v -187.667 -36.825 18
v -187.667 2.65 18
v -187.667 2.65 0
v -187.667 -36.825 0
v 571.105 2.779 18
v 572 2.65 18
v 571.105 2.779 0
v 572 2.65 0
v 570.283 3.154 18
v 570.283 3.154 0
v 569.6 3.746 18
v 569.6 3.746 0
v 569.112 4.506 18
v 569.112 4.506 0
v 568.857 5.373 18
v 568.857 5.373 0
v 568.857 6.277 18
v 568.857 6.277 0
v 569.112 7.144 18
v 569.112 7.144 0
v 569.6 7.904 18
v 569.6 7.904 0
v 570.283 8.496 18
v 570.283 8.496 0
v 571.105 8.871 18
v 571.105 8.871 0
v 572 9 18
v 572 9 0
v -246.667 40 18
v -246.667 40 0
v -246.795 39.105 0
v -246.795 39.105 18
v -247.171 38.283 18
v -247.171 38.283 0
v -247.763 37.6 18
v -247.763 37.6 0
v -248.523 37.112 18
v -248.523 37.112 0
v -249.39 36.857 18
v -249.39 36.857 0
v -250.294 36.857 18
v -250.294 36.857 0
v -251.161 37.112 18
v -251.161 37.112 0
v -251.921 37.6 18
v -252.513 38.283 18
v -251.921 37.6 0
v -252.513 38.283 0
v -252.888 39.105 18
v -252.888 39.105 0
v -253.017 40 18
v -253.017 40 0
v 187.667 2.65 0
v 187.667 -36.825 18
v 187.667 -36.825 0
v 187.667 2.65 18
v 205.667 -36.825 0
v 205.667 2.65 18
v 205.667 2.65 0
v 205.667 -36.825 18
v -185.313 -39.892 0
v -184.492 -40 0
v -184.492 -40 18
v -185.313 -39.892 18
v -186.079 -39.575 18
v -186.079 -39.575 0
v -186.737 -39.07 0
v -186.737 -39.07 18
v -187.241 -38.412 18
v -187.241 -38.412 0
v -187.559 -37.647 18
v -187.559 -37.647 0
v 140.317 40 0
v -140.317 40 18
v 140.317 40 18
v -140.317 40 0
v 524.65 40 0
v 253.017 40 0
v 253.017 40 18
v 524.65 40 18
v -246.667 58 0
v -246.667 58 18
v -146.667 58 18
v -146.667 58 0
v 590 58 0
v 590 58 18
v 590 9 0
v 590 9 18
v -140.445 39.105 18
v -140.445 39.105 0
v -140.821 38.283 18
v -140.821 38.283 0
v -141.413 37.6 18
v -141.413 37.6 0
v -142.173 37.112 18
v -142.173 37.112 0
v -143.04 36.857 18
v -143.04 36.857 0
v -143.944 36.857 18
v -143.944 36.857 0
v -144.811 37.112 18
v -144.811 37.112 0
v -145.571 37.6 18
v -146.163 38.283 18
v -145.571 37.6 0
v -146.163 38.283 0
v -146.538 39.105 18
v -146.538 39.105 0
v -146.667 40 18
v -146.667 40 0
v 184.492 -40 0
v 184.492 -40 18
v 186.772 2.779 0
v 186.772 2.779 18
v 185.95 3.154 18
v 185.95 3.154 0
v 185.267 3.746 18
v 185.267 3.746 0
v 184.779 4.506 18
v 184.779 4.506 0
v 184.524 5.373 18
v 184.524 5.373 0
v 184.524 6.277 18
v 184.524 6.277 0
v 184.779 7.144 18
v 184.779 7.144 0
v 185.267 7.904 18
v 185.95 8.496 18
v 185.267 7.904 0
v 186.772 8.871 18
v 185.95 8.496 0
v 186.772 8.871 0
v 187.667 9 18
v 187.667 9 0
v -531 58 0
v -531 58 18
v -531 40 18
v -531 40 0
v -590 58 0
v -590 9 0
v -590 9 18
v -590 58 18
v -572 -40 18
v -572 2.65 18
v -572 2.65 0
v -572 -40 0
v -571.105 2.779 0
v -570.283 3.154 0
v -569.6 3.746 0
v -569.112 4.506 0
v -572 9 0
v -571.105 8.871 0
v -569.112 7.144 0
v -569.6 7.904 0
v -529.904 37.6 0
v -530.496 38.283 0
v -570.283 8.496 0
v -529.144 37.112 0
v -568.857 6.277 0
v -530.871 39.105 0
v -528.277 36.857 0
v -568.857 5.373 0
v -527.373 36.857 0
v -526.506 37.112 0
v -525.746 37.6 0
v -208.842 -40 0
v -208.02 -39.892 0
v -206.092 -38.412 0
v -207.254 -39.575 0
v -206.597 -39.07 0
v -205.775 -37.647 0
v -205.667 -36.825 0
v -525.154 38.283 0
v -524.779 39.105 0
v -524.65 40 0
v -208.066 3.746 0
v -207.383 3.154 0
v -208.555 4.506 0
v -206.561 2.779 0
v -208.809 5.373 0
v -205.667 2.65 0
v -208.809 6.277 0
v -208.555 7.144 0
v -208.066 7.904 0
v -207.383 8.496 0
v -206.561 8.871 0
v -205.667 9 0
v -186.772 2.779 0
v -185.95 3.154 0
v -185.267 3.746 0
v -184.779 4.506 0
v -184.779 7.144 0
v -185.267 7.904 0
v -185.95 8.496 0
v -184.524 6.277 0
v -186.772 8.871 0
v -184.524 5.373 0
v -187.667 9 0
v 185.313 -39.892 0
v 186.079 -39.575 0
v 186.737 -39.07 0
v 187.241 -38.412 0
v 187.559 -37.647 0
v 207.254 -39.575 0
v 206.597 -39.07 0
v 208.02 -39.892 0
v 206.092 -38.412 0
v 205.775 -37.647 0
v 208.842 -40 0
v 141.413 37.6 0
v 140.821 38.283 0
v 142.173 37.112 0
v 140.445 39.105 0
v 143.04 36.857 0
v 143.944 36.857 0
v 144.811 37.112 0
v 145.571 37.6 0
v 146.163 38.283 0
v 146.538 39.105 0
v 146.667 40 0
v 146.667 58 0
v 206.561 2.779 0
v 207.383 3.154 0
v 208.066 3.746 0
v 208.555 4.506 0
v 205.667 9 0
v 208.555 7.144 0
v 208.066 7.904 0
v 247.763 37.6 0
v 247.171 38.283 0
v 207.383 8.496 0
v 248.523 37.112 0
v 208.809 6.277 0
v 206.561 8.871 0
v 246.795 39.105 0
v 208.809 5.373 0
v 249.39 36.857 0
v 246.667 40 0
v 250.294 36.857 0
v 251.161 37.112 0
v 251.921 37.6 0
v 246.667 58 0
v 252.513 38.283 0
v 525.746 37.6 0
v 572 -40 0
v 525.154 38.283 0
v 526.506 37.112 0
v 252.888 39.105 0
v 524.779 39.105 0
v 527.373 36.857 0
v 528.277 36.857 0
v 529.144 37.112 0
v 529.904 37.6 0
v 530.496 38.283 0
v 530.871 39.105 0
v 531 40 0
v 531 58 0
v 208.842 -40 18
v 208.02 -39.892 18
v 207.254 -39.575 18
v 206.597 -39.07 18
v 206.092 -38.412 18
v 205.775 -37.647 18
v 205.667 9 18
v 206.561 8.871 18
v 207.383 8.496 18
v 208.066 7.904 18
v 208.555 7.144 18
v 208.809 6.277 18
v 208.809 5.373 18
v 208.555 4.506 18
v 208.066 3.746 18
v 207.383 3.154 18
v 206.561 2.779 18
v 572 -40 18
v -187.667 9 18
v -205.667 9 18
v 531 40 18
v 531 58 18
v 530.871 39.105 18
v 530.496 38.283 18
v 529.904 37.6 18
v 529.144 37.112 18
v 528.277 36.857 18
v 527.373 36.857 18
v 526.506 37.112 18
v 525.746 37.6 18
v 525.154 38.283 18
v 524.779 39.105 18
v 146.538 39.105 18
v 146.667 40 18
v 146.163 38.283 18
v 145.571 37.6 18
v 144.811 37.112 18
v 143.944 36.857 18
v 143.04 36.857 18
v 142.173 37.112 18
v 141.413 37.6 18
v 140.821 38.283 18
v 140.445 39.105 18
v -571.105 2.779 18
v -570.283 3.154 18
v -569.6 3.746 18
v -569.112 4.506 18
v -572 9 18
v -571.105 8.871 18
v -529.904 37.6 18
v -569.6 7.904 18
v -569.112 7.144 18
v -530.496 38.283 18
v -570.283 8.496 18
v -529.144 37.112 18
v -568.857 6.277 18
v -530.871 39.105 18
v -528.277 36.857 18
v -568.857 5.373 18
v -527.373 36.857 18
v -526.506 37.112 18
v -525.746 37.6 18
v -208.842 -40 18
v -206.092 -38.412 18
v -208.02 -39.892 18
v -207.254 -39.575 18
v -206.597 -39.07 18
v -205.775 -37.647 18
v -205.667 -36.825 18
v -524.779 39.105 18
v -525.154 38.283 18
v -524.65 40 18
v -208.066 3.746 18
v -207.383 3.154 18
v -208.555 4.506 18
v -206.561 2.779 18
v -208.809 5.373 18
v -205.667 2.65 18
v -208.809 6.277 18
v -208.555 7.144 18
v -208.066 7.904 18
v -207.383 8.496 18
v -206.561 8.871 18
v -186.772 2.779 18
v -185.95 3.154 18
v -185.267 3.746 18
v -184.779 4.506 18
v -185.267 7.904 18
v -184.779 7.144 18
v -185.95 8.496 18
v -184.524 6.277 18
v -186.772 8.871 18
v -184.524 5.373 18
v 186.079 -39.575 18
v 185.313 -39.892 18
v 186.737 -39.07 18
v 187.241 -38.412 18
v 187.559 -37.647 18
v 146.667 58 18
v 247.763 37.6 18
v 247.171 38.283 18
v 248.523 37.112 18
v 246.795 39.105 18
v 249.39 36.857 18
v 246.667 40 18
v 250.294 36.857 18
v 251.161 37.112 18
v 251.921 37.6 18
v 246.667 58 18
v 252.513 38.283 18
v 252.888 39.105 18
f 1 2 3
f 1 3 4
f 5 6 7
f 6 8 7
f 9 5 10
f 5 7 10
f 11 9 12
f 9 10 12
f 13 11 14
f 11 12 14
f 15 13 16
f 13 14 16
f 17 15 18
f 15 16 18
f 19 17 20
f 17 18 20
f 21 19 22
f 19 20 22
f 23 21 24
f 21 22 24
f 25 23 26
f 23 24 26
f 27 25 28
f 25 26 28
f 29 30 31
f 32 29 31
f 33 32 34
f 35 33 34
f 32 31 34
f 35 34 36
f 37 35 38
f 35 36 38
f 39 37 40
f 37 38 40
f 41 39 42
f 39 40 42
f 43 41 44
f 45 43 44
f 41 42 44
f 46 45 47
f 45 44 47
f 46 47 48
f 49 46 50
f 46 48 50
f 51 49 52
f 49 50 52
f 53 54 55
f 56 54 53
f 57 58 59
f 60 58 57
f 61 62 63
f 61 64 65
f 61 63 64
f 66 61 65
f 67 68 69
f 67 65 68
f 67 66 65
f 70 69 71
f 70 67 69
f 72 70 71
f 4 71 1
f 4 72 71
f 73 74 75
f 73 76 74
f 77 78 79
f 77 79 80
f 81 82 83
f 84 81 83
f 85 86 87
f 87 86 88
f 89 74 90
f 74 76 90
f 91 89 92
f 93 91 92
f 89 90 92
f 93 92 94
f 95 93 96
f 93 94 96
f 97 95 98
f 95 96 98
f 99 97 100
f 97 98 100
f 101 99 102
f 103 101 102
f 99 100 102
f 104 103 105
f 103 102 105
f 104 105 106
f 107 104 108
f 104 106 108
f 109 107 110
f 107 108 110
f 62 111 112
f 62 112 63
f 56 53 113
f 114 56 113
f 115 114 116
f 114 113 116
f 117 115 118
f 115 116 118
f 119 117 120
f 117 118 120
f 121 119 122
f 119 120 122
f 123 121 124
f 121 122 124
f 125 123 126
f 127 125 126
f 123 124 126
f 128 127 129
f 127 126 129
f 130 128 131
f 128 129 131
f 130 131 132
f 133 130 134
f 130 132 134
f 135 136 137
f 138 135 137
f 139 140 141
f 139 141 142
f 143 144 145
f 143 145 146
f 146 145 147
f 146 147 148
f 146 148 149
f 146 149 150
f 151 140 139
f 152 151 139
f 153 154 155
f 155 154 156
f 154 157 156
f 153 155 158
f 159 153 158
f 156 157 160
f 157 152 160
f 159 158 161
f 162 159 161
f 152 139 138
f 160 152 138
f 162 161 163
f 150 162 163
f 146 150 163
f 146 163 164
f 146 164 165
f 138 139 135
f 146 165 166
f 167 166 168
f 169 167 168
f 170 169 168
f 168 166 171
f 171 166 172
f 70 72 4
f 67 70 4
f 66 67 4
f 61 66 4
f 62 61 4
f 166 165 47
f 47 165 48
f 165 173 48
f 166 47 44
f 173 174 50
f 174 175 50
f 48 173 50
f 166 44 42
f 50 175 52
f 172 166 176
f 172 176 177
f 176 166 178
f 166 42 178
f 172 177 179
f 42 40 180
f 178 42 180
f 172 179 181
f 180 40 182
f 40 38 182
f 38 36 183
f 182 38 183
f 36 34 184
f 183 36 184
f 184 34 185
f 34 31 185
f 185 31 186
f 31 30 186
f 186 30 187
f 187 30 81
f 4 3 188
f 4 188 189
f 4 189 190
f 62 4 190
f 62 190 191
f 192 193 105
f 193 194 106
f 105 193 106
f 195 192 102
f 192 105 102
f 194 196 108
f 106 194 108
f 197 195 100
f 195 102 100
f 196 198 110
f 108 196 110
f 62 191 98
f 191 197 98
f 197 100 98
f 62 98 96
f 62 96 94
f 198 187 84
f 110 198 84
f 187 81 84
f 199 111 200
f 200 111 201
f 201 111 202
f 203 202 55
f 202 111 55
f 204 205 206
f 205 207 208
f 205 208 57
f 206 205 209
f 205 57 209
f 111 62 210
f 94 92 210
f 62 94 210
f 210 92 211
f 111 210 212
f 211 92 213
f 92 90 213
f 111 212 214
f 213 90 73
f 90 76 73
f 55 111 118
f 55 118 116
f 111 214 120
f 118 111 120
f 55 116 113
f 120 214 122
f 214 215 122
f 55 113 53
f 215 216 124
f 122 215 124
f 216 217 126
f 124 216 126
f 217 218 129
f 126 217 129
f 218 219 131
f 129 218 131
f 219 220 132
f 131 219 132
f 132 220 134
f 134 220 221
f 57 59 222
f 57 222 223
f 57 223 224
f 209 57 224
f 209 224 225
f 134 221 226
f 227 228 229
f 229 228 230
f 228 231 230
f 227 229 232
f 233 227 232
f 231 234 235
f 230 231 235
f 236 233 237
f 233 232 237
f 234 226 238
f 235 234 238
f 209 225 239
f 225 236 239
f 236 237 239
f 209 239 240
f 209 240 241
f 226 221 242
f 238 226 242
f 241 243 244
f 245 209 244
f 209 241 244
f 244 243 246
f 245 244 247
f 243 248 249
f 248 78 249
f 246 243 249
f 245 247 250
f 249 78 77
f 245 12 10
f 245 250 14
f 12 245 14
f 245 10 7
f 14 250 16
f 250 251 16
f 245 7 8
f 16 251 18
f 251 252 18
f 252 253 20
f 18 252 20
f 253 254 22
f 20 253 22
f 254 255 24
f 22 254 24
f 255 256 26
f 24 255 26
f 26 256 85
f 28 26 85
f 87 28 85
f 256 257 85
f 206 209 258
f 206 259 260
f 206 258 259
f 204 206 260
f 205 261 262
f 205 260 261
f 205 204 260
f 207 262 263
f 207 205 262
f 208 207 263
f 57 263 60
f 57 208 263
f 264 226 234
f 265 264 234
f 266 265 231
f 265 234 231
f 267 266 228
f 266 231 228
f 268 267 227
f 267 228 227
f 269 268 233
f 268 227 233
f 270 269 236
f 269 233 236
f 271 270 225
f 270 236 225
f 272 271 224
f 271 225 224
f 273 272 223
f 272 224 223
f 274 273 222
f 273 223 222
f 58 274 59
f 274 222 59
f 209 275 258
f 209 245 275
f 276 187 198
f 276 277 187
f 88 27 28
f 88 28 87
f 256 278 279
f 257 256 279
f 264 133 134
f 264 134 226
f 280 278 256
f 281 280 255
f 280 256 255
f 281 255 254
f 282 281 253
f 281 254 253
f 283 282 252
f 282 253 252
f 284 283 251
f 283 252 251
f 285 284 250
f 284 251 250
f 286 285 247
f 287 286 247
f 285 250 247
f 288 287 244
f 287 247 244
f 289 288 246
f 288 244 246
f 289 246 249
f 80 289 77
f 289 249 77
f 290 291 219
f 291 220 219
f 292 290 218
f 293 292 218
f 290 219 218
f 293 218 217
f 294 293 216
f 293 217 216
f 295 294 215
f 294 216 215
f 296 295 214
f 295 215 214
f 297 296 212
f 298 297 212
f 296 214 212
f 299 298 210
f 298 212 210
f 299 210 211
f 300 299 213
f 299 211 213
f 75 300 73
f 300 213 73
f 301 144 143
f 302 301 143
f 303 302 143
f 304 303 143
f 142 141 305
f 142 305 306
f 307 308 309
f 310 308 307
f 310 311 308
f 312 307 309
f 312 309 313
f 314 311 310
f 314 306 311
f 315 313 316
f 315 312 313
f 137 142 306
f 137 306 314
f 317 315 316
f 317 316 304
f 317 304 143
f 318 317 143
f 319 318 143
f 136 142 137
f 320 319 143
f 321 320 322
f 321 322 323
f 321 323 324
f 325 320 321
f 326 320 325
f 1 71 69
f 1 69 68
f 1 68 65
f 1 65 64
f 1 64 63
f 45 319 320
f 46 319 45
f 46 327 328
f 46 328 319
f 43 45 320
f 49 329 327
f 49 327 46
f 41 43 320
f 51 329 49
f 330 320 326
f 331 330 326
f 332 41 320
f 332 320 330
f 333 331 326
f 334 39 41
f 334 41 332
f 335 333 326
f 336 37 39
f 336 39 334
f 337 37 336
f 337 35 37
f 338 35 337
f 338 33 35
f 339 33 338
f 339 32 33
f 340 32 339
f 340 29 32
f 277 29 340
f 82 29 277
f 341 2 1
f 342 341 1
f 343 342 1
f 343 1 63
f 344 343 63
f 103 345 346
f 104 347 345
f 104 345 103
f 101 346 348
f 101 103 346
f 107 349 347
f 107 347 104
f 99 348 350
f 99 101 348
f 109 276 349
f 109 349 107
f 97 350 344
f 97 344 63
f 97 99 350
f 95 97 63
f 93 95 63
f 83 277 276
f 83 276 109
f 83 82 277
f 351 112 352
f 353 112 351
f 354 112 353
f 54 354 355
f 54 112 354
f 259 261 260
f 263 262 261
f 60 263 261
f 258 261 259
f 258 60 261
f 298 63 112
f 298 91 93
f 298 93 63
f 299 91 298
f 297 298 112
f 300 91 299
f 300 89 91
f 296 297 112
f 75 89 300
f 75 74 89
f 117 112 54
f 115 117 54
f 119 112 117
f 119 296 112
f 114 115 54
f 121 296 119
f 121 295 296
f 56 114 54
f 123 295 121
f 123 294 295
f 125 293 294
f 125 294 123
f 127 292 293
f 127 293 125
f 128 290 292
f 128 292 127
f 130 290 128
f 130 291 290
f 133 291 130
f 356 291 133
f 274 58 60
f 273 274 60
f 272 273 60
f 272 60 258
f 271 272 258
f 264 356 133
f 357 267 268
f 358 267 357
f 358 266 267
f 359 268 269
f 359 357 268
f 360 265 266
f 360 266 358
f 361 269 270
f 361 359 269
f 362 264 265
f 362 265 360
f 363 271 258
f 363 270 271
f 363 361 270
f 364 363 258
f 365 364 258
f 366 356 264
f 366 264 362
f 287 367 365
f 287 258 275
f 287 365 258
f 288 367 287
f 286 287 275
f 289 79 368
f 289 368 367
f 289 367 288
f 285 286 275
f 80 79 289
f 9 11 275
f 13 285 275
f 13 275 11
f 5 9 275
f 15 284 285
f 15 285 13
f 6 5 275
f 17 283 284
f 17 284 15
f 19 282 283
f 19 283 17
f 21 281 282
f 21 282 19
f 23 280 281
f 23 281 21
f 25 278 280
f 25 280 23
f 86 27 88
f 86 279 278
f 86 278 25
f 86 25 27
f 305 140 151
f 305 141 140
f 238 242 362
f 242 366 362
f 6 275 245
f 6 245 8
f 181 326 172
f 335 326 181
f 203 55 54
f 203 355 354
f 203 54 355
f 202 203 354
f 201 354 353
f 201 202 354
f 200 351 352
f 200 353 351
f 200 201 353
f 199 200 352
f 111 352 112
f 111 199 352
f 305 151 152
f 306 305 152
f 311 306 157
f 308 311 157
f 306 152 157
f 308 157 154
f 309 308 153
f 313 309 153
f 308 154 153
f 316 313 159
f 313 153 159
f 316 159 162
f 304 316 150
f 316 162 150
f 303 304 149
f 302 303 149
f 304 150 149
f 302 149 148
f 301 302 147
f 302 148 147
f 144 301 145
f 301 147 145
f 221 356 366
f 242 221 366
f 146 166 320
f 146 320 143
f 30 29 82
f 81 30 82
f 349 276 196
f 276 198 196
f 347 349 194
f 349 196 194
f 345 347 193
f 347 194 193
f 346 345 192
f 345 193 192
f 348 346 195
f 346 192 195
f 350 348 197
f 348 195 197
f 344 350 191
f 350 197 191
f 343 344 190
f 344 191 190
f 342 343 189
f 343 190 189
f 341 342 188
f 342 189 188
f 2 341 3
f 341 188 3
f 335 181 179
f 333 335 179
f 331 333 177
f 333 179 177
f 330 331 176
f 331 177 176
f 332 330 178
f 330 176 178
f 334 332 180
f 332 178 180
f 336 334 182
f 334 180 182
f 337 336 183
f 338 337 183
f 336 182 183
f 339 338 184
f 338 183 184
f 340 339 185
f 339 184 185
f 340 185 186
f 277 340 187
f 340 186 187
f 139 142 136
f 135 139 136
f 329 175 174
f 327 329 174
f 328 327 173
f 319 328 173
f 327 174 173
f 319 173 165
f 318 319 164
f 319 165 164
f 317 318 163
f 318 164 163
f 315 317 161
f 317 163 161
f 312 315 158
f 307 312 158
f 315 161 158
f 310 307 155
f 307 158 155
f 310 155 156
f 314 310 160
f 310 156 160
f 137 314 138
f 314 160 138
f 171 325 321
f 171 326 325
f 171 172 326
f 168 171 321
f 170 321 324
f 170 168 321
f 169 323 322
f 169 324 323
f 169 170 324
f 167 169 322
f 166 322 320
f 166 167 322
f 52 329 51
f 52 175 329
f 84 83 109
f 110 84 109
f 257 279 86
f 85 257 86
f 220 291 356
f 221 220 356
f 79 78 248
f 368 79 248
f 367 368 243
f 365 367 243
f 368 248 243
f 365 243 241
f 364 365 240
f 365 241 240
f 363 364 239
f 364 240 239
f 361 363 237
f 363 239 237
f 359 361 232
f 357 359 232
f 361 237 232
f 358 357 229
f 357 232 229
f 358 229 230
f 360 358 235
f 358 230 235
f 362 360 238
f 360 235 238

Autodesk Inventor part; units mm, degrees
ref_plane "YZ Plane" through (0, 0, 0) normal (1, 0, 0) x (0, 1, 0)
sketch "Sketch1" plane through (0, 0, 0) normal (0, 0, 1) x (1, 0, 0)
  line L0 (-590, 40) -> (590, 40)
  line L1 (590, 40) -> (590, -40)
  line L2 (590, -40) -> (-590, -40)
  line L3 (-590, -40) -> (-590, 40)
  point P0 (0, 0)
  point P1 (-590, 0)
  point P2 (0, 40)
  dimension "d0" = 80
  dimension "d1" = 1180
extrude "Extrusion1" add sketch "Sketch1" along normal blind 18
sketch "Sketch2" plane through (0, 0, 18) normal (0, 0, 1) x (1, 0, 0)
  line L0 (590, 40) -> (-590, 40) projected
  line L1 (-590, 40) -> (-590, -40) projected
  line L2 (-590, -40) -> (590, -40) projected
  line L3 (590, -40) -> (590, 40) projected
  line L4 (-590, 58) -> (-531, 58)
  line L5 (-531, 58) -> (-531, 40)
  line L6 (-531, 40) -> (-590, 40)
  line L7 (-590, 40) -> (-590, 58)
  point P0 (0, 0)
  point P1 (-560.5, 40)
  point P2 (0, 40)
  point P3 (-590, 49)
  point P4 (-590, 0)
  dimension "d4" = 18
  dimension "d5" = 59
extrude "Extrusion2" add sketch "Sketch2" against normal blind 18 contours L0 L7 L4 L5
ref_plane "Work Plane1" through (0, -40, 0) normal (-1, 0, 0) x (0, 0, 1)
sketch "Sketch3" plane through (0, 0, 18) normal (0, 0, 1) x (1, 0, 0)
  line L0 (-246.6667, 58) -> (-146.6667, 58)
  line L1 (-146.6667, 58) -> (-146.6667, 40)
  line L2 (-146.6667, 40) -> (-246.6667, 40)
  line L3 (-246.6667, 40) -> (-246.6667, 58)
  line L4 (590, 40) -> (-531, 40) projected
  line L5 (-531, 58) -> (-531, 40) projected
  line L6 (-590, 58) -> (-531, 58) projected
  line L7 (-590, -40) -> (-590, 58) projected
  line L8 (-590, -40) -> (590, -40) projected
  line L9 (590, -40) -> (590, 40) projected
  point P0 (0, 0)
  point P1 (-196.6667, 40)
  point P2 (29.5, 40)
  dimension "d8" = 18
  dimension "d9" = 100
  dimension "d10" = 393.3333
extrude "Extrusion3" add sketch "Sketch3" against normal blind 18 contours L0 L1 L2 L3
mirror "Mirror1" about plane through (0, -40, 0) normal (-1, 0, 0) of "Extrusion2", "Extrusion3"
sketch "Sketch4" plane through (0, 0, 18) normal (0, 0, 1) x (1, 0, 0)
  line L0 (531, 40) -> (246.6667, 40) projected
  line L1 (246.6667, 40) -> (246.6667, 58) projected
  line L2 (246.6667, 58) -> (146.6667, 58) projected
  line L3 (146.6667, 58) -> (146.6667, 40) projected
  line L4 (146.6667, 40) -> (-146.6667, 40) projected
  line L5 (-146.6667, 58) -> (-146.6667, 40) projected
  line L6 (-246.6667, 58) -> (-146.6667, 58) projected
  line L7 (-246.6667, 40) -> (-246.6667, 58) projected
  line L8 (-246.6667, 40) -> (-531, 40) projected
  line L9 (-531, 58) -> (-531, 40) projected
  line L10 (-590, 58) -> (-531, 58) projected
  line L11 (-590, -40) -> (-590, 58) projected
  line L12 (-590, -40) -> (590, -40) projected
  line L13 (590, -40) -> (590, 58) projected
  line L14 (590, 58) -> (531, 58) projected
  line L15 (531, 58) -> (531, 40) projected
  line L16 (-590, 9) -> (-572, 9)
  line L17 (-572, 9) -> (-572, -40)
  line L18 (-572, -40) -> (-590, -40)
  line L19 (-590, -40) -> (-590, 9)
  point P0 (0, 0)
  point P1 (-590, -15.5)
  point P2 (-590, 9)
  point P3 (-581, -40)
  point P4 (0, -40)
  dimension "d13" = 18
  dimension "d14" = 49
extrude "Extrusion4" cut sketch "Sketch4" against normal blind 18 contours L12 L11 L16 L17
mirror "Mirror2" about plane through (0, -40, 0) normal (-1, 0, 0) of "Extrusion4"
sketch "Sketch5" plane through (0, 0, 18) normal (0, 0, 1) x (1, 0, 0)
  line L0 (-205.6667, 9) -> (-187.6667, 9)
  line L1 (-187.6667, 9) -> (-187.6667, -40)
  line L2 (-187.6667, -40) -> (-205.6667, -40)
  line L3 (-205.6667, -40) -> (-205.6667, 9)
  line L4 (572, -40) -> (572, 9) projected
  line L5 (572, 9) -> (590, 9) projected
  line L6 (590, 9) -> (590, 58) projected
  line L7 (590, 58) -> (531, 58) projected
  line L8 (531, 58) -> (531, 40) projected
  line L9 (531, 40) -> (246.6667, 40) projected
  line L10 (246.6667, 40) -> (246.6667, 58) projected
  line L11 (246.6667, 58) -> (146.6667, 58) projected
  line L12 (146.6667, 58) -> (146.6667, 40) projected
  line L13 (146.6667, 40) -> (-146.6667, 40) projected
  line L14 (-146.6667, 58) -> (-146.6667, 40) projected
  line L15 (-246.6667, 58) -> (-146.6667, 58) projected
  line L16 (-246.6667, 40) -> (-246.6667, 58) projected
  line L17 (-246.6667, 40) -> (-531, 40) projected
  line L18 (-531, 58) -> (-531, 40) projected
  line L19 (-590, 58) -> (-531, 58) projected
  line L20 (-590, 9) -> (-590, 58) projected
  line L21 (-590, 9) -> (-572, 9) projected
  line L22 (-572, 9) -> (-572, -40) projected
  line L23 (-572, -40) -> (572, -40) projected
  point P0 (0, 0)
  point P1 (-196.6667, -40)
  point P2 (0, -40)
  point P3 (-196.6667, 9)
  point P4 (-196.6667, 58)
  dimension "d17" = 18
  dimension "d18" = 49
extrude "Extrusion5" cut sketch "Sketch5" against normal blind 18 contours L0 L1 L2 L3
mirror "Mirror3" about plane through (0, -40, 0) normal (-1, 0, 0) of "Extrusion5"
sketch "Sketch6" plane through (0, 0, 18) normal (0, 0, 1) x (1, 0, 0)
  line L0 (187.6667, -40) -> (187.6667, 9) projected
  line L1 (187.6667, 9) -> (205.6667, 9) projected
  line L2 (205.6667, 9) -> (205.6667, -40) projected
  line L3 (205.6667, -40) -> (572, -40) projected
  line L4 (572, -40) -> (572, 9) projected
  line L5 (572, 9) -> (590, 9) projected
  line L6 (590, 9) -> (590, 58) projected
  line L7 (590, 58) -> (531, 58) projected
  line L8 (531, 58) -> (531, 40) projected
  line L9 (531, 40) -> (246.6667, 40) projected
  line L10 (246.6667, 40) -> (246.6667, 58) projected
  line L11 (246.6667, 58) -> (146.6667, 58) projected
  line L12 (146.6667, 58) -> (146.6667, 40) projected
  line L13 (146.6667, 40) -> (-146.6667, 40) projected
  line L14 (-146.6667, 58) -> (-146.6667, 40) projected
  line L15 (-246.6667, 58) -> (-146.6667, 58) projected
  line L16 (-246.6667, 40) -> (-246.6667, 58) projected
  line L17 (-246.6667, 40) -> (-531, 40) projected
  line L18 (-531, 58) -> (-531, 40) projected
  line L19 (-590, 58) -> (-531, 58) projected
  line L20 (-590, 9) -> (-590, 58) projected
  line L21 (-590, 9) -> (-572, 9) projected
  line L22 (-572, 9) -> (-572, -40) projected
  line L23 (-572, -40) -> (-205.6667, -40) projected
  line L24 (-205.6667, -40) -> (-205.6667, 9) projected
  line L25 (-205.6667, 9) -> (-187.6667, 9) projected
  line L26 (-187.6667, 9) -> (-187.6667, -40) projected
  line L27 (-187.6667, -40) -> (187.6667, -40) projected
  point P0 (0, 0)
  point P1 (-527.825, 40)
  point P2 (-572, 5.825)
  dimension "d21" = 3.175
  dimension "d22" = 3.175
hole "Hole1" at (-527.825, 40, 18) at (-572, 5.825, 18) direction (0, 0, -1) diameter 6.35 end through all
mirror "Mirror4" about plane through (0, -40, 0) normal (-1, 0, 0) of "Hole1"
sketch "Sketch7" plane through (0, 0, 18) normal (0, 0, 1) x (1, 0, 0)
  arc A0 (524.65, 40) -> (531, 40) centre (527.825, 40) ccw projected
  line L0 (524.65, 40) -> (246.6667, 40) projected
  line L1 (246.6667, 40) -> (246.6667, 58) projected
  line L2 (246.6667, 58) -> (146.6667, 58) projected
  line L3 (146.6667, 58) -> (146.6667, 40) projected
  line L4 (146.6667, 40) -> (-146.6667, 40) projected
  line L5 (-146.6667, 58) -> (-146.6667, 40) projected
  line L6 (-246.6667, 58) -> (-146.6667, 58) projected
  line L7 (-246.6667, 40) -> (-246.6667, 58) projected
  line L8 (-246.6667, 40) -> (-524.65, 40) projected
  arc A1 (-531, 40) -> (-524.65, 40) centre (-527.825, 40) ccw projected
  line L9 (-531, 58) -> (-531, 40) projected
  line L10 (-590, 58) -> (-531, 58) projected
  line L11 (-590, 9) -> (-590, 58) projected
  line L12 (-590, 9) -> (-572, 9) projected
  arc A2 (-572, 2.65) -> (-572, 9) centre (-572, 5.825) ccw projected
  line L13 (-572, 2.65) -> (-572, -40) projected
  line L14 (-572, -40) -> (-205.6667, -40) projected
  line L15 (-205.6667, -40) -> (-205.6667, 9) projected
  line L16 (-205.6667, 9) -> (-187.6667, 9) projected
  line L17 (-187.6667, 9) -> (-187.6667, -40) projected
  line L18 (-187.6667, -40) -> (187.6667, -40) projected
  line L19 (187.6667, -40) -> (187.6667, 9) projected
  line L20 (187.6667, 9) -> (205.6667, 9) projected
  line L21 (205.6667, 9) -> (205.6667, -40) projected
  line L22 (205.6667, -40) -> (572, -40) projected
  line L23 (572, -40) -> (572, 2.65) projected
  arc A3 (572, 9) -> (572, 2.65) centre (572, 5.825) ccw projected
  line L24 (572, 9) -> (590, 9) projected
  line L25 (590, 9) -> (590, 58) projected
  line L26 (590, 58) -> (531, 58) projected
  line L27 (531, 58) -> (531, 40) projected
  point P0 (0, 0)
  point P1 (-249.8417, 40)
  point P2 (-205.6667, 5.825)
  dimension "d30" = 3.175
  dimension "d31" = 3.175
hole "Hole2" at (-249.8417, 40, 18) at (-205.6667, 5.825, 18) direction (0, 0, -1) diameter 6.35 end through all
ref_plane "Work Plane2" through (-196.6667, -40, 18) normal (1, 0, 0) x (0, 0, -1)
mirror "Mirror5" about plane through (-196.6667, -40, 18) normal (1, 0, 0) of "Hole2"
mirror "Mirror6" about plane through (0, -40, 0) normal (-1, 0, 0) of "Hole2", "Mirror5"
fillet "Fillet1" radius 3.175 4 edges at (-205.6667, -40, 9) (-187.6667, -40, 9) (187.6667, -40, 9) (205.6667, -40, 9)
equation "\"d0\" = legTopDepth"
equation "\"d1\" = tableLength"
equation "\"d2\" = plyThickness"
equation "\"d4\" = legTopTabHeight"
equation "\"d5\" = 0.5 * plyThickness + 0.5 * legTabTotalWidth"
equation "\"d6\" = plyThickness"
equation "\"d8\" = legTopTabHeight"
equation "\"d9\" = legTabTotalWidth"
equation "\"d10\" = 0.333333 * tableLength"
equation "\"d11\" = plyThickness"
equation "\"d13\" = plyThickness"
equation "\"d14\" = legTopSlotDepth"
equation "\"d15\" = plyThickness"
equation "\"d17\" = plyThickness"
equation "\"d18\" = legTopSlotDepth"
equation "\"d19\" = plyThickness"
equation "\"d21\" = 0.5 * millDiameter"
equation "\"d22\" = 0.5 * millDiameter"
equation "\"d23\" = millDiameter"
equation "\"d30\" = 0.5 * millDiameter"
equation "\"d31\" = 0.5 * millDiameter"
equation "\"d32\" = millDiameter"
equation "\"d39\" = 0.5 * millDiameter"
equation "\"plyThickness\" = 18"
equation "\"legHeight\" = 702"
equation "\"tableLength\" = 1180"
equation "\"legTopDepth\" = 80"
equation "\"millDiameter\" = 6.35"
equation "\"legTopTabHeight\" = 18"
equation "\"legTabTotalWidth\" = 100"
equation "\"legTopSlotDepth\" = 49"
properties part number "longSlat"
